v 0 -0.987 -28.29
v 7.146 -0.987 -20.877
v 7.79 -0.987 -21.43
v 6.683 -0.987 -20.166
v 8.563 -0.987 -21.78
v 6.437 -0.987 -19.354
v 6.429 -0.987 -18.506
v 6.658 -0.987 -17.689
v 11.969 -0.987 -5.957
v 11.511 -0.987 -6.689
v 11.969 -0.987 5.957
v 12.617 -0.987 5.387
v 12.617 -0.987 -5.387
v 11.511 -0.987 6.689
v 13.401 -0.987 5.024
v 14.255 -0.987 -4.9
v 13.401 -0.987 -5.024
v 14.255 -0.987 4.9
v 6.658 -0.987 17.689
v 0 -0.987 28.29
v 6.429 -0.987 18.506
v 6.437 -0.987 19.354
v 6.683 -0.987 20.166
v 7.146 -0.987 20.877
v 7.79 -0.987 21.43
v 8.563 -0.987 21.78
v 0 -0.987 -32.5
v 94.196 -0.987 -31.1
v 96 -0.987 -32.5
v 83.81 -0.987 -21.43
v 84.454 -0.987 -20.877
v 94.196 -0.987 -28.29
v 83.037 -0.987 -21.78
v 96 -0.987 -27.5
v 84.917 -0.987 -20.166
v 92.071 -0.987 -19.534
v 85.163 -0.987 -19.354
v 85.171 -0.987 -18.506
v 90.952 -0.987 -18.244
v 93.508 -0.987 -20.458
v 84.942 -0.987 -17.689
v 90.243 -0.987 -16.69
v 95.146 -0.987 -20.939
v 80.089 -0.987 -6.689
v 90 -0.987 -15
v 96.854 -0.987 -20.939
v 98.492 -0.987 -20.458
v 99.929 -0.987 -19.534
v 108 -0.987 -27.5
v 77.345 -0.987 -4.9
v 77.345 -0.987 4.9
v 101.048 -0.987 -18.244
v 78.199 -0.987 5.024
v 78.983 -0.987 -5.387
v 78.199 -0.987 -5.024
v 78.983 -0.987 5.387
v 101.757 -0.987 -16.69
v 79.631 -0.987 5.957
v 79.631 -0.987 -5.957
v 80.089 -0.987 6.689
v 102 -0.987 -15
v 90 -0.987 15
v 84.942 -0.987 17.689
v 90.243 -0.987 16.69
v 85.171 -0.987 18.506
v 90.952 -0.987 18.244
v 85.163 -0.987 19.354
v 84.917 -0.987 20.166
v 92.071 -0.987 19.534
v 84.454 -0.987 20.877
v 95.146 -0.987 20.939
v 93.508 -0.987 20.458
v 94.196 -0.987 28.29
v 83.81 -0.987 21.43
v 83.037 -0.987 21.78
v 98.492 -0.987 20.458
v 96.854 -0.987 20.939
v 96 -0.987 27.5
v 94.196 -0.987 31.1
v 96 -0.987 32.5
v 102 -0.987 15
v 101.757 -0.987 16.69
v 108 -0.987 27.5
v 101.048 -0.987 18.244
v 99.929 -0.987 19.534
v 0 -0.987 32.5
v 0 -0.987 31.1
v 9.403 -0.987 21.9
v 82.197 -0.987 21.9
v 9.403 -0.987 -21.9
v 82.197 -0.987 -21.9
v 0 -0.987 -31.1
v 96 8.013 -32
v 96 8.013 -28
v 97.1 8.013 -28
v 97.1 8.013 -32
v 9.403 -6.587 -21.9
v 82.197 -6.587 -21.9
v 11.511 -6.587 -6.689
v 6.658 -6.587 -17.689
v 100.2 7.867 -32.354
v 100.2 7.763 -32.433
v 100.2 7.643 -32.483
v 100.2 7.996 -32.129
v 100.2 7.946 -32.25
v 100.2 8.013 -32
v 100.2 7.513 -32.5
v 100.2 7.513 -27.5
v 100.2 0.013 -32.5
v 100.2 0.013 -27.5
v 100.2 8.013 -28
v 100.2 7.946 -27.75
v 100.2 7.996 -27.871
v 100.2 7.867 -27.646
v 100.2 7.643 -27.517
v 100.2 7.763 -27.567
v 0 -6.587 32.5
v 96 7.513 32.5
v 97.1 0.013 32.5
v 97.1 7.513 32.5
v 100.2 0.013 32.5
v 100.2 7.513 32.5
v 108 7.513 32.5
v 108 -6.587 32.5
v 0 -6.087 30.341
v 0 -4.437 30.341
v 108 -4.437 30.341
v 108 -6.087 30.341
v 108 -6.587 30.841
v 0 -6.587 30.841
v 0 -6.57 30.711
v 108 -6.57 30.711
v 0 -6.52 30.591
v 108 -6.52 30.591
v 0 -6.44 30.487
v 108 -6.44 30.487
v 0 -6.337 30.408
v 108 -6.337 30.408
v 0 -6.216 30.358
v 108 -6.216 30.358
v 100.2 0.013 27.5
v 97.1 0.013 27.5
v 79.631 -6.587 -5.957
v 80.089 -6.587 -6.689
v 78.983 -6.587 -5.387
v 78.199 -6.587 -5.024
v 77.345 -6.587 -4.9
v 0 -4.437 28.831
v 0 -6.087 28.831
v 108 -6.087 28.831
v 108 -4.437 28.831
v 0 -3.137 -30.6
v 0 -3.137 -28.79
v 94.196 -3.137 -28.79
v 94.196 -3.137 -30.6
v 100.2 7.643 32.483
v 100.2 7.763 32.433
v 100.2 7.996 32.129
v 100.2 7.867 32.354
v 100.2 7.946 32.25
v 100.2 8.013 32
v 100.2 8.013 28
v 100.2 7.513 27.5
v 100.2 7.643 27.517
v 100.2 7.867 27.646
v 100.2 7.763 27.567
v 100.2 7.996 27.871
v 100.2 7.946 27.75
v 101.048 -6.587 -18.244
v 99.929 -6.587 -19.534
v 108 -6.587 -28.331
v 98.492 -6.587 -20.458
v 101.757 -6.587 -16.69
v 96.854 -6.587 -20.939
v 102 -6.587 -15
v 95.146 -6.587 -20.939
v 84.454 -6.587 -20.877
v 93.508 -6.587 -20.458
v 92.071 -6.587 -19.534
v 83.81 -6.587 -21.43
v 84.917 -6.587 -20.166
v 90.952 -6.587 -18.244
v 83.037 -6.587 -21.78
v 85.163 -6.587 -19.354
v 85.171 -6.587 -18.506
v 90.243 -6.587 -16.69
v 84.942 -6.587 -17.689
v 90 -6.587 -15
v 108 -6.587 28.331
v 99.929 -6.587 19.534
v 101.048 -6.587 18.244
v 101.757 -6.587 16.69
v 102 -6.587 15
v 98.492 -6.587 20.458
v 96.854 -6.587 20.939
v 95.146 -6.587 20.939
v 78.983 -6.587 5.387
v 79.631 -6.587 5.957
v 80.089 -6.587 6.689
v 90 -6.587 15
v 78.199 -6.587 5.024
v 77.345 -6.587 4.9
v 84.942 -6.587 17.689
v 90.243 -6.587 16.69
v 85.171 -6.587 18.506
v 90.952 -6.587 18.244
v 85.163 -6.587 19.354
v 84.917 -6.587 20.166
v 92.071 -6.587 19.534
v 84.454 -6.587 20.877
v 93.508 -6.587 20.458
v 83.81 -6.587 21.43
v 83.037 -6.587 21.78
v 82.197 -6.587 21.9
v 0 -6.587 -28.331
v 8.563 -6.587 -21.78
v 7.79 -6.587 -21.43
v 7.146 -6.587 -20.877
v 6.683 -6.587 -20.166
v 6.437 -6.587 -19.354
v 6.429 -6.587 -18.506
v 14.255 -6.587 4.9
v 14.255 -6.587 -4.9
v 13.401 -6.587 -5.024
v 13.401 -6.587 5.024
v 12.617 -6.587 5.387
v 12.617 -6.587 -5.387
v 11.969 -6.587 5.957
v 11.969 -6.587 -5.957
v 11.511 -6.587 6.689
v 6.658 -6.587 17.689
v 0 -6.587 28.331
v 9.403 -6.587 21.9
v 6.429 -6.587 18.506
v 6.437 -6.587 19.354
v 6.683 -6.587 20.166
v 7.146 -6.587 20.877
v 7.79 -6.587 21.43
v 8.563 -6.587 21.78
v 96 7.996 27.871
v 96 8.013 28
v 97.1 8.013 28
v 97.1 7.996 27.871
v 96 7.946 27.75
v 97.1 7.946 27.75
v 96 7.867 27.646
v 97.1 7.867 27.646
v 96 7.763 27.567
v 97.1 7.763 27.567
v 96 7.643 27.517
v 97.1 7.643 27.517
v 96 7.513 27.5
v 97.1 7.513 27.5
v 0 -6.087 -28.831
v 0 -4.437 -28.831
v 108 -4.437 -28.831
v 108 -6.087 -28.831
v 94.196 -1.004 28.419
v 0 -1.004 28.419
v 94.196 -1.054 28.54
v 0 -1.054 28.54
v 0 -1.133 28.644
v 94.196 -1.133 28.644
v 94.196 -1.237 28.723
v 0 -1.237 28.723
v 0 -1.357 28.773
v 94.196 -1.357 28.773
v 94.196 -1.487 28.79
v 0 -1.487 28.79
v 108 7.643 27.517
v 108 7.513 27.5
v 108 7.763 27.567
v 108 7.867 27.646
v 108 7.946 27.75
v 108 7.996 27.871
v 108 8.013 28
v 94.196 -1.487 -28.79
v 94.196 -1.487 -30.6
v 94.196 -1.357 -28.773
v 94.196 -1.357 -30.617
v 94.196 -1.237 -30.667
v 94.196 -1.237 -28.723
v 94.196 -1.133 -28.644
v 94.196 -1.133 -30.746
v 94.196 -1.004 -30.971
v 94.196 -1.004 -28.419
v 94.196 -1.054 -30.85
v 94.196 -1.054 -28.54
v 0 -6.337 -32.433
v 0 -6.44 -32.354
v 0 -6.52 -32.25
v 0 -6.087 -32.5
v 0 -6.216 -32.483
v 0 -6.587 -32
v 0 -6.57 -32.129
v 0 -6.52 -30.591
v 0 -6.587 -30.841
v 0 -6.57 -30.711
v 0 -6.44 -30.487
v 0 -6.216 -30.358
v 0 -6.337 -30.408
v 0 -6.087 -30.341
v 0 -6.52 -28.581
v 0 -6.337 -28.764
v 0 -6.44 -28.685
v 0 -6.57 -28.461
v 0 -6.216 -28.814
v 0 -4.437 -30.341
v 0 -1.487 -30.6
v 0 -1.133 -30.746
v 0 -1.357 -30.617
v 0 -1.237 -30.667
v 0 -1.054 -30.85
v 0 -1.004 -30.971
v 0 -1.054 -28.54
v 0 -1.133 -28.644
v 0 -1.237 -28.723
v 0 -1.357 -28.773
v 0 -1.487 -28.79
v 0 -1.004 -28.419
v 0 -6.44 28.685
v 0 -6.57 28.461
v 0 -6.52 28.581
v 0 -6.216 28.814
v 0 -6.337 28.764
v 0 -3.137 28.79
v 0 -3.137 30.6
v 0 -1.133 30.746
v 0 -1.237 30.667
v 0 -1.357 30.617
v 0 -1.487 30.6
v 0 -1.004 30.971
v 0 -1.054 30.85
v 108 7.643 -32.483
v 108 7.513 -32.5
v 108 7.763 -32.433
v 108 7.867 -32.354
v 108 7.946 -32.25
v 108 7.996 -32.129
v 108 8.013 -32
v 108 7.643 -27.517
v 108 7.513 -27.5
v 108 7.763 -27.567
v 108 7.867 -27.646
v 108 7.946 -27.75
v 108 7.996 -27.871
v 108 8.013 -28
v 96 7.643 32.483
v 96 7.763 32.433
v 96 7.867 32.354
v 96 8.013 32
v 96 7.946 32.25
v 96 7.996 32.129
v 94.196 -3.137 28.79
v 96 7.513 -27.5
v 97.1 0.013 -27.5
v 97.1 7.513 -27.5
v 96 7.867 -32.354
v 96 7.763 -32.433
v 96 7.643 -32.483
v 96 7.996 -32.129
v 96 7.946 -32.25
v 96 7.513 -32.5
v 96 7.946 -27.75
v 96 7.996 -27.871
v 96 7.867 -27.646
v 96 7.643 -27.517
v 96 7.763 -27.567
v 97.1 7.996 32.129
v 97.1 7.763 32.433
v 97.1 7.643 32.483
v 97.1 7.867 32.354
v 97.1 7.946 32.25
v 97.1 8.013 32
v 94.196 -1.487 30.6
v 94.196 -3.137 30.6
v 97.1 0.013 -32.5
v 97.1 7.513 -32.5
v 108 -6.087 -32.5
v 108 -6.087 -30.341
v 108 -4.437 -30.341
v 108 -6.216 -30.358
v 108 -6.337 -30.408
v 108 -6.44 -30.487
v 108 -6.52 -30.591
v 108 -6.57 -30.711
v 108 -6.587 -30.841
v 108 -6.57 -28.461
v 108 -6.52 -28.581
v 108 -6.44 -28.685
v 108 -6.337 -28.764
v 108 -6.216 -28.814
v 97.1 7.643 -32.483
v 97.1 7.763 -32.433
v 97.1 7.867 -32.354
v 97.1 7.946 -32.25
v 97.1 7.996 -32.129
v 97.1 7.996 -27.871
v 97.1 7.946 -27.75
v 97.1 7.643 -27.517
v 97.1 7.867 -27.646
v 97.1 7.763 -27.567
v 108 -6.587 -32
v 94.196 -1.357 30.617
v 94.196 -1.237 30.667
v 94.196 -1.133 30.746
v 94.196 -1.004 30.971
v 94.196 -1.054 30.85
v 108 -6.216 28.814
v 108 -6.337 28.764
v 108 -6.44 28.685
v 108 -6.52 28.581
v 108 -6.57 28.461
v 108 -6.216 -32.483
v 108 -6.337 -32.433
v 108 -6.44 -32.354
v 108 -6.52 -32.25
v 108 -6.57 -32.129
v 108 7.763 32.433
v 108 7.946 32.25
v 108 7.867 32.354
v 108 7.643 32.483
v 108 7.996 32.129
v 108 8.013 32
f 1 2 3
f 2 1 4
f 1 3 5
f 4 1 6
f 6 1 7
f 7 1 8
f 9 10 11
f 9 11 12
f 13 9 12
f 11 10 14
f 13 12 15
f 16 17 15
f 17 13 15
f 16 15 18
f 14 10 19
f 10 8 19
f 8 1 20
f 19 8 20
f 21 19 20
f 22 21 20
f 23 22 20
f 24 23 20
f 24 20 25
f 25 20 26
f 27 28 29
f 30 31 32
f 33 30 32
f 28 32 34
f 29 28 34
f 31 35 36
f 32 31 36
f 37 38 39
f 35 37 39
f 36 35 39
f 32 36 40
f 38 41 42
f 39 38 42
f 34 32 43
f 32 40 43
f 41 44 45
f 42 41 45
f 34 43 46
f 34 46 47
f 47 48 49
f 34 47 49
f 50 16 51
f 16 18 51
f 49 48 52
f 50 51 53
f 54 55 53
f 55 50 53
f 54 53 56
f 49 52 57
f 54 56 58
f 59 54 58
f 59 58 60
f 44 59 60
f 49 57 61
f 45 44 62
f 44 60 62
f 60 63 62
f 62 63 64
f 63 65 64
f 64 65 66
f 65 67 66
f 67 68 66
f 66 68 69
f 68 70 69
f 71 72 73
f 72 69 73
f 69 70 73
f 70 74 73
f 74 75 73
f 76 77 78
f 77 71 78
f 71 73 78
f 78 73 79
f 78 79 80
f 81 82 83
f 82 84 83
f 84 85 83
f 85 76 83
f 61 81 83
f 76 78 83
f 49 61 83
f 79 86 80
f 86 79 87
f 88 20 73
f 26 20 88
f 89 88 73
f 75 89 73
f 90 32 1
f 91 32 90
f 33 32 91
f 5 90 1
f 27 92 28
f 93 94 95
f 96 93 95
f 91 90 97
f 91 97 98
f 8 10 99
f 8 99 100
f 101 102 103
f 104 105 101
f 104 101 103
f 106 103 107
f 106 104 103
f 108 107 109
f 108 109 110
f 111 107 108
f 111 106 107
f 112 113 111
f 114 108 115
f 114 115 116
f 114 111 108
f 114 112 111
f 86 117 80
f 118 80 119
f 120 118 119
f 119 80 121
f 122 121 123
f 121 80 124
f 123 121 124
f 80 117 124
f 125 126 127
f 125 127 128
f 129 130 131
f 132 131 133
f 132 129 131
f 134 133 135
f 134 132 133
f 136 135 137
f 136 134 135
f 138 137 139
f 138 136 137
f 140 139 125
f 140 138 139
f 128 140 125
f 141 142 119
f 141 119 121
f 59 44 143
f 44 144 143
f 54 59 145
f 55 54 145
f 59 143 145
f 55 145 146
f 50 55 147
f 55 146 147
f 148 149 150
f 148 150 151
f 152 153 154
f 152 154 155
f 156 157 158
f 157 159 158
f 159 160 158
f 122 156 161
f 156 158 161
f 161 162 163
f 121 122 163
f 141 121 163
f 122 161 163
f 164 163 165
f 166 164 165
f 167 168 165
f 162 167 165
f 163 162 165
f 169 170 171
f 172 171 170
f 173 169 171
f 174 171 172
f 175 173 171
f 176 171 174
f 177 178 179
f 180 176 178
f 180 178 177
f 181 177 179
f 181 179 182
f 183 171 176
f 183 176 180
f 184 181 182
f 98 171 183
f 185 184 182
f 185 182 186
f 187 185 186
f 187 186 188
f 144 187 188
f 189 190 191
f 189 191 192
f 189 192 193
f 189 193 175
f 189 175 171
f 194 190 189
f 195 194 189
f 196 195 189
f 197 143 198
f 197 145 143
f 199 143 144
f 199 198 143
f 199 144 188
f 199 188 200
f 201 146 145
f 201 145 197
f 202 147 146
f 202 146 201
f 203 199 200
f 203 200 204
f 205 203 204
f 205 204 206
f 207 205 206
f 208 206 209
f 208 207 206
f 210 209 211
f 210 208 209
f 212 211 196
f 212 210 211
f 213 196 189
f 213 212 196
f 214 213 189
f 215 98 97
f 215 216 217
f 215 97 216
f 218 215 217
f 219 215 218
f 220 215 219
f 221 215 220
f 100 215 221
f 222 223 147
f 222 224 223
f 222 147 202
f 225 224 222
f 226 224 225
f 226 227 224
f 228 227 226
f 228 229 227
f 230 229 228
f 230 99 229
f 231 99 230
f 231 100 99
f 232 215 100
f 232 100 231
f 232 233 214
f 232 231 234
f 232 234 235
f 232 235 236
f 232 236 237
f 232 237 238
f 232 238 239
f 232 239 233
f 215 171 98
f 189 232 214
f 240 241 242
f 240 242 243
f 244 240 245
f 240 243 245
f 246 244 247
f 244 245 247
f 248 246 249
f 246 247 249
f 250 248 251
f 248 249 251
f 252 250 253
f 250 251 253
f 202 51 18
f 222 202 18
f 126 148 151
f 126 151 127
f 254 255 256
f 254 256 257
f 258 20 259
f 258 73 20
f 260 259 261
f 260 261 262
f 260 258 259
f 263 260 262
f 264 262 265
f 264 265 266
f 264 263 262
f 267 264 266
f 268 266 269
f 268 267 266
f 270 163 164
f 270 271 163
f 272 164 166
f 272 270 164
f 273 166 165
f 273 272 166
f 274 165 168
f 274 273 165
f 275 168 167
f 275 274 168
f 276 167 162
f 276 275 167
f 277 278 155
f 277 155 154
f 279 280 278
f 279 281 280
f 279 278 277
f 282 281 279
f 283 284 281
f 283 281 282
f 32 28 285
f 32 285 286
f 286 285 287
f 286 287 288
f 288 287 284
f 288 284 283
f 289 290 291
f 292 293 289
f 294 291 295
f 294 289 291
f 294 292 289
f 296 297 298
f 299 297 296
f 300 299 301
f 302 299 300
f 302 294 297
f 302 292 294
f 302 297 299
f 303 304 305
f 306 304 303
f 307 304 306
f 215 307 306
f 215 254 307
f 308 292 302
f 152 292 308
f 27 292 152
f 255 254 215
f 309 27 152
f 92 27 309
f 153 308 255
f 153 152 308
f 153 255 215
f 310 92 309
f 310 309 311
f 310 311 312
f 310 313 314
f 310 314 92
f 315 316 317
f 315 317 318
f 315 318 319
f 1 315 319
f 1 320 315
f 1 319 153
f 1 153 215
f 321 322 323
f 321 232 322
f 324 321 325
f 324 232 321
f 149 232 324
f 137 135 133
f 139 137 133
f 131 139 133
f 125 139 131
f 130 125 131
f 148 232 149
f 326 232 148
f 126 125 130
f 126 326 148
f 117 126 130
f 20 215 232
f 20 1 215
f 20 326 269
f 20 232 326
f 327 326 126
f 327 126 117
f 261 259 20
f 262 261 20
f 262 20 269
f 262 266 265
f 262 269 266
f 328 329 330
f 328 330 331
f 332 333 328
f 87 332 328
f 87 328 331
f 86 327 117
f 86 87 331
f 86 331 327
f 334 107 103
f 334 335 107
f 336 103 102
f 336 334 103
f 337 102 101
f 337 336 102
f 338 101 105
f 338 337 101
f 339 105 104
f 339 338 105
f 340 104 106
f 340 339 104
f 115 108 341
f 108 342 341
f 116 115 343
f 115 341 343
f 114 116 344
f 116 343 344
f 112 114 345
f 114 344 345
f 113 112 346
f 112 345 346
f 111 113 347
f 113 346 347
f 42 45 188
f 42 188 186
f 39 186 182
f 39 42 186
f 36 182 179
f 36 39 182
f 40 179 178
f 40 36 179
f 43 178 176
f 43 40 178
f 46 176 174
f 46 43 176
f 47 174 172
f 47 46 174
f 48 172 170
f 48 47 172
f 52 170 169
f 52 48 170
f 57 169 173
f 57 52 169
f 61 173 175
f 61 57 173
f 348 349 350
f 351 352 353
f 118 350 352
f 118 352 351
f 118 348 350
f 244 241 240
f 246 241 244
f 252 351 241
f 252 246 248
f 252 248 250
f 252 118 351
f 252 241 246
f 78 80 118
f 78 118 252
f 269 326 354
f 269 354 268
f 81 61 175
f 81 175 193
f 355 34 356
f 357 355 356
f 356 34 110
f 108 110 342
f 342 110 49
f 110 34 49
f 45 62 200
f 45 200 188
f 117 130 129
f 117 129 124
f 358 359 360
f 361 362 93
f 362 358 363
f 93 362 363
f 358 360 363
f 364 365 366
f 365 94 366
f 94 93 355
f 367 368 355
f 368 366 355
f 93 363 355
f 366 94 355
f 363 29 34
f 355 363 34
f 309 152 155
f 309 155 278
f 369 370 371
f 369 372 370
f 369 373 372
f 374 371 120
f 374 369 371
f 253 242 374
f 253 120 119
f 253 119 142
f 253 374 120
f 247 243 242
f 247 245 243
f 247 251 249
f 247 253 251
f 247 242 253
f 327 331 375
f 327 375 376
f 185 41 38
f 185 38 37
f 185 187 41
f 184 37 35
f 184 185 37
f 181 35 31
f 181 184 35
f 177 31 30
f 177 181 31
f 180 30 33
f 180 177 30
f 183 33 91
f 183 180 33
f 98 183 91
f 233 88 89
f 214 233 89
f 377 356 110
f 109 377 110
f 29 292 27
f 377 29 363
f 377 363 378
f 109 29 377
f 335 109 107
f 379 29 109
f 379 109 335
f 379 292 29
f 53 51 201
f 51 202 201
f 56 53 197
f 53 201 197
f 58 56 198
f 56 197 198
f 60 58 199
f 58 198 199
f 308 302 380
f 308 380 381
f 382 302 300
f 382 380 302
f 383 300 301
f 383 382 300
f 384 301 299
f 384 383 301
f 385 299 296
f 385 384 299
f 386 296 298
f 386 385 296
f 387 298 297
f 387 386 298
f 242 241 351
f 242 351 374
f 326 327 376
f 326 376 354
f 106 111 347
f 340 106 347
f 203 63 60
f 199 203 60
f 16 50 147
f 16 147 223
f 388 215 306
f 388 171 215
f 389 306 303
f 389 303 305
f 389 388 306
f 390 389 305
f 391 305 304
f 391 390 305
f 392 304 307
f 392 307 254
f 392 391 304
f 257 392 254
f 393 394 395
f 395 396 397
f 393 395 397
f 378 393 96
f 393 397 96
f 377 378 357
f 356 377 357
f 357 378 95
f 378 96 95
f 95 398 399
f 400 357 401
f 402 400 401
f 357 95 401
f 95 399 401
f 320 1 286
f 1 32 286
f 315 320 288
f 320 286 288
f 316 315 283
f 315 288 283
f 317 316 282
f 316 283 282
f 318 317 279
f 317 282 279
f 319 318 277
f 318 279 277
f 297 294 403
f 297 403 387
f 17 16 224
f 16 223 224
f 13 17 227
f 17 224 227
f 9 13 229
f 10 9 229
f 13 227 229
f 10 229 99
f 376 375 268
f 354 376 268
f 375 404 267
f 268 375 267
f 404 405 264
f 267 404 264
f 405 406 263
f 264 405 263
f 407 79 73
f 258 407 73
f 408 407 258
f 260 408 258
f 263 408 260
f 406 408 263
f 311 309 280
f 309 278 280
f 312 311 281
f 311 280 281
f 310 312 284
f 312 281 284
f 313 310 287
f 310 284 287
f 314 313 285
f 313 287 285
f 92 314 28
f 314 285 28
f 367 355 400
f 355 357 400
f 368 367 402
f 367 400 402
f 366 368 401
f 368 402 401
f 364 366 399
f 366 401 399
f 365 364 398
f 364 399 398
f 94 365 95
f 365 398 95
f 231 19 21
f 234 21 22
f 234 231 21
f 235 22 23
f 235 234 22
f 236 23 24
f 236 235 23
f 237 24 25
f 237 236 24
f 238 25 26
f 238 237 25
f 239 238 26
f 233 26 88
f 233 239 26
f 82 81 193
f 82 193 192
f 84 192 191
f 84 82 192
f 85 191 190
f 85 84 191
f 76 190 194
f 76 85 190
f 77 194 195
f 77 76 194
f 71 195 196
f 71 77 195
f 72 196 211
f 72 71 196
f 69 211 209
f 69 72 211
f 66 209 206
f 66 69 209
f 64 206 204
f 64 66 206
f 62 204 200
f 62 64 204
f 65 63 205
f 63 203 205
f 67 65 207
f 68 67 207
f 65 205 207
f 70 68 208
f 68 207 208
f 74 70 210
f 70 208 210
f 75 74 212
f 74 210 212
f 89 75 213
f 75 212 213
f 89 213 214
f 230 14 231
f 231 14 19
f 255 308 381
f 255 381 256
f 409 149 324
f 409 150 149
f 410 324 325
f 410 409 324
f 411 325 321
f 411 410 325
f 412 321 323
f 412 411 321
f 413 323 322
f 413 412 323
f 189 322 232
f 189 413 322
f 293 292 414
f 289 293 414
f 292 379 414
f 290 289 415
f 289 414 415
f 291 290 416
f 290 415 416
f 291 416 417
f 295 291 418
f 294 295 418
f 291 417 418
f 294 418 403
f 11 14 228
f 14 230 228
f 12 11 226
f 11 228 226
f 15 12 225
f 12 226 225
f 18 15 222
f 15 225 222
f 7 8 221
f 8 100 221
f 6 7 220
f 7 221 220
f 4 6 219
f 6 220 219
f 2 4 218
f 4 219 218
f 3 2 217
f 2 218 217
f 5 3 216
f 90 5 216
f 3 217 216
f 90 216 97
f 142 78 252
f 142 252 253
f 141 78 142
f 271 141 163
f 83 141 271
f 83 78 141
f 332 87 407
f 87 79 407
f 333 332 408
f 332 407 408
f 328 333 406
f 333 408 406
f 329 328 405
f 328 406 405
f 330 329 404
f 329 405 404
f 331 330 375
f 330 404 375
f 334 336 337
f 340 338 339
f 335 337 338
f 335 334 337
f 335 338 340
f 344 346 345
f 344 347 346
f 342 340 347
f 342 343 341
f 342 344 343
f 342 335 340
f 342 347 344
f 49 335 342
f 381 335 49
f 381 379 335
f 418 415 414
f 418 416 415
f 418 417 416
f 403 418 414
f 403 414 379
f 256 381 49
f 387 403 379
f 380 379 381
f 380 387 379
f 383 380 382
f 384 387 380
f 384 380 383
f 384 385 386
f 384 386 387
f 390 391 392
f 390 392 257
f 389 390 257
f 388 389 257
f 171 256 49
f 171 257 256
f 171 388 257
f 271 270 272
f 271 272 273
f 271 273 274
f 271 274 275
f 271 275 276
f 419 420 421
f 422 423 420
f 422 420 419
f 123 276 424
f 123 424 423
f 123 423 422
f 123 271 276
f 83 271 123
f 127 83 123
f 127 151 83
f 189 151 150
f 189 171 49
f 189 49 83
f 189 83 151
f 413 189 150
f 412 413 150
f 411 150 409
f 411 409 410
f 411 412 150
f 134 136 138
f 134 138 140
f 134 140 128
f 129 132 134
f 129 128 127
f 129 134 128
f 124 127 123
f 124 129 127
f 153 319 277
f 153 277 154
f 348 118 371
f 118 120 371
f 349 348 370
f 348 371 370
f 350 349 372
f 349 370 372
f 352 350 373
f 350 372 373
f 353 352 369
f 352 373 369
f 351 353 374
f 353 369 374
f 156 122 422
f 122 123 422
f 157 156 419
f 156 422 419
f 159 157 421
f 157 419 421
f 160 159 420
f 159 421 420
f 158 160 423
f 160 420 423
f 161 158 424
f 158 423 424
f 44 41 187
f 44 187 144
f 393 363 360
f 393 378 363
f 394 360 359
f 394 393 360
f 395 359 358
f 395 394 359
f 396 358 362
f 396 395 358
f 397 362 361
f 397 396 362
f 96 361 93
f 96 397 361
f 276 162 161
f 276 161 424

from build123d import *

# Parameters (mm, degrees)
BOSS_EXTRUDE1_DEPTH = 108
BOSS_EXTRUDE3_REACH = 114.923
SKETCH5_W           = 13.804456559
SKETCH5_H           = 5
SKETCH7_W           = 12
SKETCH7_H           = 5
BOSS_EXTRUDE4_DEPTH = 9
SKETCH8_W           = 3.1
SKETCH8_H           = 5
CUT_EXTRUDE1_DEPTH  = 8
FILLET1_R           = 0.5
FILLET2_R           = 0.5
FILLET3_R           = 0.5
FILLET4_R           = 0.5
FILLET5_R           = 0.5
FILLET6_R           = 0.5
FILLET7_R           = 0.5
FILLET8_R           = 0.5
CUT_EXTRUDE2_DEPTH  = 10
FILLET9_R           = 3


with BuildPart() as part:
    # Sketch1 → Boss-Extrude1 (new body)
    with BuildSketch(Plane(origin=(0, 0, 0), x_dir=(0, 0, -1), z_dir=(1, 0, 0))):
        Polygon((32.5, -0.986763128), (32.5, -6.586763128), (30.340675248, -6.586763128), (30.340675248, -4.436763128), (28.831367778, -4.436763128), (28.831367778, -6.586763128), (-28.831367778, -6.586763128), (-28.831367778, -4.436763128), (-30.340675248, -4.436763128), (-30.340675248, -6.586763128), (-32.5, -6.586763128), (-32.5, -0.986763128), (-30.6, -0.986763128), (-30.6, -3.136763128), (-28.79, -3.136763128), (-28.79, -0.986763128), (28.79, -0.986763128), (28.79, -3.136763128), (30.6, -3.136763128), (30.6, -0.986763128), align=None)
    extrude(amount=BOSS_EXTRUDE1_DEPTH)

    # Sketch5 → Boss-Extrude3 (add, up to next)
    with BuildSketch(Plane(origin=(0, -0.986763128, 0), x_dir=(1, 0, 0), z_dir=(0, 1, 0)), mode=Mode.PRIVATE) as boss_extrude3_sk1:
        with Locations((101.097771721, -30)):
            Rectangle(SKETCH5_W, SKETCH5_H)
    boss_extrude3_tool1 = extrude(boss_extrude3_sk1.sketch, amount=-BOSS_EXTRUDE3_REACH, mode=Mode.PRIVATE) - part.part
    boss_extrude3 = boss_extrude3_tool1.solids().sort_by_distance((101.097772, -0.986763, 30))[0]
    add(boss_extrude3)

    # Sketch7 → Boss-Extrude4 (add)
    with BuildSketch(Plane(origin=(0, -0.986763128, 0), x_dir=(1, 0, 0), z_dir=(0, 1, 0))):
        with Locations((102, -30)):
            Rectangle(SKETCH7_W, SKETCH7_H)
    boss_extrude4 = extrude(amount=BOSS_EXTRUDE4_DEPTH)

    # Mirror1: Boss-Extrude4 across plane
    add(boss_extrude4.mirror(Plane.XY))

    # Mirror2: Boss-Extrude3 across plane
    add(boss_extrude3.mirror(Plane.XY))

    # Sketch8 → Cut-Extrude1 (cut)
    with BuildSketch(Plane(origin=(0, 8.013236872, 0), x_dir=(1, 0, 0), z_dir=(0, 1, 0))):
        with Locations((98.65, -30)):
            Rectangle(SKETCH8_W, SKETCH8_H)
    cut_extrude1 = extrude(amount=-CUT_EXTRUDE1_DEPTH, mode=Mode.SUBTRACT)

    # Mirror3: Cut-Extrude1 across plane
    add(cut_extrude1.mirror(Plane.XY), mode=Mode.SUBTRACT)

    # Fillet1
    fillet1_edges = [part.edges().sort_by_distance(p)[0] for p in [
        (47.09777172, -0.986763128, 30.6),
    ]]
    fillet(fillet1_edges, radius=FILLET1_R)

    # Fillet2
    fillet2_edges = [part.edges().sort_by_distance(p)[0] for p in [
        (47.09777172, -0.986763128, 28.79),
    ]]
    fillet(fillet2_edges, radius=FILLET2_R)

    # Fillet3
    fillet3_edges = [part.edges().sort_by_distance(p)[0] for p in [
        (54, -6.586763128, 30.340675248),
    ]]
    fillet(fillet3_edges, radius=FILLET3_R)

    # Fillet4
    fillet4_edges = [part.edges().sort_by_distance(p)[0] for p in [
        (54, -6.586763128, 28.831367778),
    ]]
    fillet(fillet4_edges, radius=FILLET4_R)

    # Fillet5
    fillet5_edges = [part.edges().sort_by_distance(p)[0] for p in [
        (104.1, 8.013236872, 32.5),
    ]]
    fillet(fillet5_edges, radius=FILLET5_R)

    # Fillet6
    fillet6_edges = [part.edges().sort_by_distance(p)[0] for p in [
        (96.55, 8.013236872, 32.5),
    ]]
    fillet(fillet6_edges, radius=FILLET6_R)

    # Fillet7
    fillet7_edges = [part.edges().sort_by_distance(p)[0] for p in [
        (47.09777172, -0.986763128, -28.79),
        (96.55, 8.013236872, 27.5),
        (104.1, 8.013236872, -32.5),
        (96.55, 8.013236872, -27.5),
        (54, -6.586763128, -32.5),
        (54, -6.586763128, -30.340675248),
        (54, -6.586763128, -28.831367778),
        (104.1, 8.013236872, 27.5),
        (96.55, 8.013236872, -32.5),
        (104.1, 8.013236872, -27.5),
    ]]
    fillet(fillet7_edges, radius=FILLET7_R)

    # Fillet8
    fillet8_edges = [part.edges().sort_by_distance(p)[0] for p in [
        (47.09777172, -0.986763128, -30.6),
    ]]
    fillet(fillet8_edges, radius=FILLET8_R)

    # Sketch9 → Cut-Extrude2 (cut)
    with BuildSketch(Plane(origin=(0, -0.986763128, 0), x_dir=(1, 0, 0), z_dir=(0, 1, 0))):
        with BuildLine():
            Line((90, -15), (90, 15))
            ThreePointArc((90, 15), (96, 21), (102, 15))
            Line((102, 15), (102, -15))
            ThreePointArc((102, -15), (96, -21), (90, -15))
        make_face()
        Polygon((86.8, 21.9), (79.3, 4.9), (12.3, 4.9), (4.8, 21.9), align=None)
        Polygon((4.8, -21.9), (86.8, -21.9), (79.3, -4.9), (12.3, -4.9), align=None)
    extrude(amount=-CUT_EXTRUDE2_DEPTH, mode=Mode.SUBTRACT)

    # Fillet9
    fillet9_edges = [part.edges().sort_by_distance(p)[0] for p in [
        (86.8, -3.786763128, 21.9),
        (4.8, -3.786763128, 21.9),
        (12.3, -3.786763128, 4.9),
        (79.3, -3.786763128, 4.9),
        (4.8, -3.786763128, -21.9),
        (86.8, -3.786763128, -21.9),
        (79.3, -3.786763128, -4.9),
        (12.3, -3.786763128, -4.9),
    ]]
    fillet(fillet9_edges, radius=FILLET9_R)


solid = part.part
